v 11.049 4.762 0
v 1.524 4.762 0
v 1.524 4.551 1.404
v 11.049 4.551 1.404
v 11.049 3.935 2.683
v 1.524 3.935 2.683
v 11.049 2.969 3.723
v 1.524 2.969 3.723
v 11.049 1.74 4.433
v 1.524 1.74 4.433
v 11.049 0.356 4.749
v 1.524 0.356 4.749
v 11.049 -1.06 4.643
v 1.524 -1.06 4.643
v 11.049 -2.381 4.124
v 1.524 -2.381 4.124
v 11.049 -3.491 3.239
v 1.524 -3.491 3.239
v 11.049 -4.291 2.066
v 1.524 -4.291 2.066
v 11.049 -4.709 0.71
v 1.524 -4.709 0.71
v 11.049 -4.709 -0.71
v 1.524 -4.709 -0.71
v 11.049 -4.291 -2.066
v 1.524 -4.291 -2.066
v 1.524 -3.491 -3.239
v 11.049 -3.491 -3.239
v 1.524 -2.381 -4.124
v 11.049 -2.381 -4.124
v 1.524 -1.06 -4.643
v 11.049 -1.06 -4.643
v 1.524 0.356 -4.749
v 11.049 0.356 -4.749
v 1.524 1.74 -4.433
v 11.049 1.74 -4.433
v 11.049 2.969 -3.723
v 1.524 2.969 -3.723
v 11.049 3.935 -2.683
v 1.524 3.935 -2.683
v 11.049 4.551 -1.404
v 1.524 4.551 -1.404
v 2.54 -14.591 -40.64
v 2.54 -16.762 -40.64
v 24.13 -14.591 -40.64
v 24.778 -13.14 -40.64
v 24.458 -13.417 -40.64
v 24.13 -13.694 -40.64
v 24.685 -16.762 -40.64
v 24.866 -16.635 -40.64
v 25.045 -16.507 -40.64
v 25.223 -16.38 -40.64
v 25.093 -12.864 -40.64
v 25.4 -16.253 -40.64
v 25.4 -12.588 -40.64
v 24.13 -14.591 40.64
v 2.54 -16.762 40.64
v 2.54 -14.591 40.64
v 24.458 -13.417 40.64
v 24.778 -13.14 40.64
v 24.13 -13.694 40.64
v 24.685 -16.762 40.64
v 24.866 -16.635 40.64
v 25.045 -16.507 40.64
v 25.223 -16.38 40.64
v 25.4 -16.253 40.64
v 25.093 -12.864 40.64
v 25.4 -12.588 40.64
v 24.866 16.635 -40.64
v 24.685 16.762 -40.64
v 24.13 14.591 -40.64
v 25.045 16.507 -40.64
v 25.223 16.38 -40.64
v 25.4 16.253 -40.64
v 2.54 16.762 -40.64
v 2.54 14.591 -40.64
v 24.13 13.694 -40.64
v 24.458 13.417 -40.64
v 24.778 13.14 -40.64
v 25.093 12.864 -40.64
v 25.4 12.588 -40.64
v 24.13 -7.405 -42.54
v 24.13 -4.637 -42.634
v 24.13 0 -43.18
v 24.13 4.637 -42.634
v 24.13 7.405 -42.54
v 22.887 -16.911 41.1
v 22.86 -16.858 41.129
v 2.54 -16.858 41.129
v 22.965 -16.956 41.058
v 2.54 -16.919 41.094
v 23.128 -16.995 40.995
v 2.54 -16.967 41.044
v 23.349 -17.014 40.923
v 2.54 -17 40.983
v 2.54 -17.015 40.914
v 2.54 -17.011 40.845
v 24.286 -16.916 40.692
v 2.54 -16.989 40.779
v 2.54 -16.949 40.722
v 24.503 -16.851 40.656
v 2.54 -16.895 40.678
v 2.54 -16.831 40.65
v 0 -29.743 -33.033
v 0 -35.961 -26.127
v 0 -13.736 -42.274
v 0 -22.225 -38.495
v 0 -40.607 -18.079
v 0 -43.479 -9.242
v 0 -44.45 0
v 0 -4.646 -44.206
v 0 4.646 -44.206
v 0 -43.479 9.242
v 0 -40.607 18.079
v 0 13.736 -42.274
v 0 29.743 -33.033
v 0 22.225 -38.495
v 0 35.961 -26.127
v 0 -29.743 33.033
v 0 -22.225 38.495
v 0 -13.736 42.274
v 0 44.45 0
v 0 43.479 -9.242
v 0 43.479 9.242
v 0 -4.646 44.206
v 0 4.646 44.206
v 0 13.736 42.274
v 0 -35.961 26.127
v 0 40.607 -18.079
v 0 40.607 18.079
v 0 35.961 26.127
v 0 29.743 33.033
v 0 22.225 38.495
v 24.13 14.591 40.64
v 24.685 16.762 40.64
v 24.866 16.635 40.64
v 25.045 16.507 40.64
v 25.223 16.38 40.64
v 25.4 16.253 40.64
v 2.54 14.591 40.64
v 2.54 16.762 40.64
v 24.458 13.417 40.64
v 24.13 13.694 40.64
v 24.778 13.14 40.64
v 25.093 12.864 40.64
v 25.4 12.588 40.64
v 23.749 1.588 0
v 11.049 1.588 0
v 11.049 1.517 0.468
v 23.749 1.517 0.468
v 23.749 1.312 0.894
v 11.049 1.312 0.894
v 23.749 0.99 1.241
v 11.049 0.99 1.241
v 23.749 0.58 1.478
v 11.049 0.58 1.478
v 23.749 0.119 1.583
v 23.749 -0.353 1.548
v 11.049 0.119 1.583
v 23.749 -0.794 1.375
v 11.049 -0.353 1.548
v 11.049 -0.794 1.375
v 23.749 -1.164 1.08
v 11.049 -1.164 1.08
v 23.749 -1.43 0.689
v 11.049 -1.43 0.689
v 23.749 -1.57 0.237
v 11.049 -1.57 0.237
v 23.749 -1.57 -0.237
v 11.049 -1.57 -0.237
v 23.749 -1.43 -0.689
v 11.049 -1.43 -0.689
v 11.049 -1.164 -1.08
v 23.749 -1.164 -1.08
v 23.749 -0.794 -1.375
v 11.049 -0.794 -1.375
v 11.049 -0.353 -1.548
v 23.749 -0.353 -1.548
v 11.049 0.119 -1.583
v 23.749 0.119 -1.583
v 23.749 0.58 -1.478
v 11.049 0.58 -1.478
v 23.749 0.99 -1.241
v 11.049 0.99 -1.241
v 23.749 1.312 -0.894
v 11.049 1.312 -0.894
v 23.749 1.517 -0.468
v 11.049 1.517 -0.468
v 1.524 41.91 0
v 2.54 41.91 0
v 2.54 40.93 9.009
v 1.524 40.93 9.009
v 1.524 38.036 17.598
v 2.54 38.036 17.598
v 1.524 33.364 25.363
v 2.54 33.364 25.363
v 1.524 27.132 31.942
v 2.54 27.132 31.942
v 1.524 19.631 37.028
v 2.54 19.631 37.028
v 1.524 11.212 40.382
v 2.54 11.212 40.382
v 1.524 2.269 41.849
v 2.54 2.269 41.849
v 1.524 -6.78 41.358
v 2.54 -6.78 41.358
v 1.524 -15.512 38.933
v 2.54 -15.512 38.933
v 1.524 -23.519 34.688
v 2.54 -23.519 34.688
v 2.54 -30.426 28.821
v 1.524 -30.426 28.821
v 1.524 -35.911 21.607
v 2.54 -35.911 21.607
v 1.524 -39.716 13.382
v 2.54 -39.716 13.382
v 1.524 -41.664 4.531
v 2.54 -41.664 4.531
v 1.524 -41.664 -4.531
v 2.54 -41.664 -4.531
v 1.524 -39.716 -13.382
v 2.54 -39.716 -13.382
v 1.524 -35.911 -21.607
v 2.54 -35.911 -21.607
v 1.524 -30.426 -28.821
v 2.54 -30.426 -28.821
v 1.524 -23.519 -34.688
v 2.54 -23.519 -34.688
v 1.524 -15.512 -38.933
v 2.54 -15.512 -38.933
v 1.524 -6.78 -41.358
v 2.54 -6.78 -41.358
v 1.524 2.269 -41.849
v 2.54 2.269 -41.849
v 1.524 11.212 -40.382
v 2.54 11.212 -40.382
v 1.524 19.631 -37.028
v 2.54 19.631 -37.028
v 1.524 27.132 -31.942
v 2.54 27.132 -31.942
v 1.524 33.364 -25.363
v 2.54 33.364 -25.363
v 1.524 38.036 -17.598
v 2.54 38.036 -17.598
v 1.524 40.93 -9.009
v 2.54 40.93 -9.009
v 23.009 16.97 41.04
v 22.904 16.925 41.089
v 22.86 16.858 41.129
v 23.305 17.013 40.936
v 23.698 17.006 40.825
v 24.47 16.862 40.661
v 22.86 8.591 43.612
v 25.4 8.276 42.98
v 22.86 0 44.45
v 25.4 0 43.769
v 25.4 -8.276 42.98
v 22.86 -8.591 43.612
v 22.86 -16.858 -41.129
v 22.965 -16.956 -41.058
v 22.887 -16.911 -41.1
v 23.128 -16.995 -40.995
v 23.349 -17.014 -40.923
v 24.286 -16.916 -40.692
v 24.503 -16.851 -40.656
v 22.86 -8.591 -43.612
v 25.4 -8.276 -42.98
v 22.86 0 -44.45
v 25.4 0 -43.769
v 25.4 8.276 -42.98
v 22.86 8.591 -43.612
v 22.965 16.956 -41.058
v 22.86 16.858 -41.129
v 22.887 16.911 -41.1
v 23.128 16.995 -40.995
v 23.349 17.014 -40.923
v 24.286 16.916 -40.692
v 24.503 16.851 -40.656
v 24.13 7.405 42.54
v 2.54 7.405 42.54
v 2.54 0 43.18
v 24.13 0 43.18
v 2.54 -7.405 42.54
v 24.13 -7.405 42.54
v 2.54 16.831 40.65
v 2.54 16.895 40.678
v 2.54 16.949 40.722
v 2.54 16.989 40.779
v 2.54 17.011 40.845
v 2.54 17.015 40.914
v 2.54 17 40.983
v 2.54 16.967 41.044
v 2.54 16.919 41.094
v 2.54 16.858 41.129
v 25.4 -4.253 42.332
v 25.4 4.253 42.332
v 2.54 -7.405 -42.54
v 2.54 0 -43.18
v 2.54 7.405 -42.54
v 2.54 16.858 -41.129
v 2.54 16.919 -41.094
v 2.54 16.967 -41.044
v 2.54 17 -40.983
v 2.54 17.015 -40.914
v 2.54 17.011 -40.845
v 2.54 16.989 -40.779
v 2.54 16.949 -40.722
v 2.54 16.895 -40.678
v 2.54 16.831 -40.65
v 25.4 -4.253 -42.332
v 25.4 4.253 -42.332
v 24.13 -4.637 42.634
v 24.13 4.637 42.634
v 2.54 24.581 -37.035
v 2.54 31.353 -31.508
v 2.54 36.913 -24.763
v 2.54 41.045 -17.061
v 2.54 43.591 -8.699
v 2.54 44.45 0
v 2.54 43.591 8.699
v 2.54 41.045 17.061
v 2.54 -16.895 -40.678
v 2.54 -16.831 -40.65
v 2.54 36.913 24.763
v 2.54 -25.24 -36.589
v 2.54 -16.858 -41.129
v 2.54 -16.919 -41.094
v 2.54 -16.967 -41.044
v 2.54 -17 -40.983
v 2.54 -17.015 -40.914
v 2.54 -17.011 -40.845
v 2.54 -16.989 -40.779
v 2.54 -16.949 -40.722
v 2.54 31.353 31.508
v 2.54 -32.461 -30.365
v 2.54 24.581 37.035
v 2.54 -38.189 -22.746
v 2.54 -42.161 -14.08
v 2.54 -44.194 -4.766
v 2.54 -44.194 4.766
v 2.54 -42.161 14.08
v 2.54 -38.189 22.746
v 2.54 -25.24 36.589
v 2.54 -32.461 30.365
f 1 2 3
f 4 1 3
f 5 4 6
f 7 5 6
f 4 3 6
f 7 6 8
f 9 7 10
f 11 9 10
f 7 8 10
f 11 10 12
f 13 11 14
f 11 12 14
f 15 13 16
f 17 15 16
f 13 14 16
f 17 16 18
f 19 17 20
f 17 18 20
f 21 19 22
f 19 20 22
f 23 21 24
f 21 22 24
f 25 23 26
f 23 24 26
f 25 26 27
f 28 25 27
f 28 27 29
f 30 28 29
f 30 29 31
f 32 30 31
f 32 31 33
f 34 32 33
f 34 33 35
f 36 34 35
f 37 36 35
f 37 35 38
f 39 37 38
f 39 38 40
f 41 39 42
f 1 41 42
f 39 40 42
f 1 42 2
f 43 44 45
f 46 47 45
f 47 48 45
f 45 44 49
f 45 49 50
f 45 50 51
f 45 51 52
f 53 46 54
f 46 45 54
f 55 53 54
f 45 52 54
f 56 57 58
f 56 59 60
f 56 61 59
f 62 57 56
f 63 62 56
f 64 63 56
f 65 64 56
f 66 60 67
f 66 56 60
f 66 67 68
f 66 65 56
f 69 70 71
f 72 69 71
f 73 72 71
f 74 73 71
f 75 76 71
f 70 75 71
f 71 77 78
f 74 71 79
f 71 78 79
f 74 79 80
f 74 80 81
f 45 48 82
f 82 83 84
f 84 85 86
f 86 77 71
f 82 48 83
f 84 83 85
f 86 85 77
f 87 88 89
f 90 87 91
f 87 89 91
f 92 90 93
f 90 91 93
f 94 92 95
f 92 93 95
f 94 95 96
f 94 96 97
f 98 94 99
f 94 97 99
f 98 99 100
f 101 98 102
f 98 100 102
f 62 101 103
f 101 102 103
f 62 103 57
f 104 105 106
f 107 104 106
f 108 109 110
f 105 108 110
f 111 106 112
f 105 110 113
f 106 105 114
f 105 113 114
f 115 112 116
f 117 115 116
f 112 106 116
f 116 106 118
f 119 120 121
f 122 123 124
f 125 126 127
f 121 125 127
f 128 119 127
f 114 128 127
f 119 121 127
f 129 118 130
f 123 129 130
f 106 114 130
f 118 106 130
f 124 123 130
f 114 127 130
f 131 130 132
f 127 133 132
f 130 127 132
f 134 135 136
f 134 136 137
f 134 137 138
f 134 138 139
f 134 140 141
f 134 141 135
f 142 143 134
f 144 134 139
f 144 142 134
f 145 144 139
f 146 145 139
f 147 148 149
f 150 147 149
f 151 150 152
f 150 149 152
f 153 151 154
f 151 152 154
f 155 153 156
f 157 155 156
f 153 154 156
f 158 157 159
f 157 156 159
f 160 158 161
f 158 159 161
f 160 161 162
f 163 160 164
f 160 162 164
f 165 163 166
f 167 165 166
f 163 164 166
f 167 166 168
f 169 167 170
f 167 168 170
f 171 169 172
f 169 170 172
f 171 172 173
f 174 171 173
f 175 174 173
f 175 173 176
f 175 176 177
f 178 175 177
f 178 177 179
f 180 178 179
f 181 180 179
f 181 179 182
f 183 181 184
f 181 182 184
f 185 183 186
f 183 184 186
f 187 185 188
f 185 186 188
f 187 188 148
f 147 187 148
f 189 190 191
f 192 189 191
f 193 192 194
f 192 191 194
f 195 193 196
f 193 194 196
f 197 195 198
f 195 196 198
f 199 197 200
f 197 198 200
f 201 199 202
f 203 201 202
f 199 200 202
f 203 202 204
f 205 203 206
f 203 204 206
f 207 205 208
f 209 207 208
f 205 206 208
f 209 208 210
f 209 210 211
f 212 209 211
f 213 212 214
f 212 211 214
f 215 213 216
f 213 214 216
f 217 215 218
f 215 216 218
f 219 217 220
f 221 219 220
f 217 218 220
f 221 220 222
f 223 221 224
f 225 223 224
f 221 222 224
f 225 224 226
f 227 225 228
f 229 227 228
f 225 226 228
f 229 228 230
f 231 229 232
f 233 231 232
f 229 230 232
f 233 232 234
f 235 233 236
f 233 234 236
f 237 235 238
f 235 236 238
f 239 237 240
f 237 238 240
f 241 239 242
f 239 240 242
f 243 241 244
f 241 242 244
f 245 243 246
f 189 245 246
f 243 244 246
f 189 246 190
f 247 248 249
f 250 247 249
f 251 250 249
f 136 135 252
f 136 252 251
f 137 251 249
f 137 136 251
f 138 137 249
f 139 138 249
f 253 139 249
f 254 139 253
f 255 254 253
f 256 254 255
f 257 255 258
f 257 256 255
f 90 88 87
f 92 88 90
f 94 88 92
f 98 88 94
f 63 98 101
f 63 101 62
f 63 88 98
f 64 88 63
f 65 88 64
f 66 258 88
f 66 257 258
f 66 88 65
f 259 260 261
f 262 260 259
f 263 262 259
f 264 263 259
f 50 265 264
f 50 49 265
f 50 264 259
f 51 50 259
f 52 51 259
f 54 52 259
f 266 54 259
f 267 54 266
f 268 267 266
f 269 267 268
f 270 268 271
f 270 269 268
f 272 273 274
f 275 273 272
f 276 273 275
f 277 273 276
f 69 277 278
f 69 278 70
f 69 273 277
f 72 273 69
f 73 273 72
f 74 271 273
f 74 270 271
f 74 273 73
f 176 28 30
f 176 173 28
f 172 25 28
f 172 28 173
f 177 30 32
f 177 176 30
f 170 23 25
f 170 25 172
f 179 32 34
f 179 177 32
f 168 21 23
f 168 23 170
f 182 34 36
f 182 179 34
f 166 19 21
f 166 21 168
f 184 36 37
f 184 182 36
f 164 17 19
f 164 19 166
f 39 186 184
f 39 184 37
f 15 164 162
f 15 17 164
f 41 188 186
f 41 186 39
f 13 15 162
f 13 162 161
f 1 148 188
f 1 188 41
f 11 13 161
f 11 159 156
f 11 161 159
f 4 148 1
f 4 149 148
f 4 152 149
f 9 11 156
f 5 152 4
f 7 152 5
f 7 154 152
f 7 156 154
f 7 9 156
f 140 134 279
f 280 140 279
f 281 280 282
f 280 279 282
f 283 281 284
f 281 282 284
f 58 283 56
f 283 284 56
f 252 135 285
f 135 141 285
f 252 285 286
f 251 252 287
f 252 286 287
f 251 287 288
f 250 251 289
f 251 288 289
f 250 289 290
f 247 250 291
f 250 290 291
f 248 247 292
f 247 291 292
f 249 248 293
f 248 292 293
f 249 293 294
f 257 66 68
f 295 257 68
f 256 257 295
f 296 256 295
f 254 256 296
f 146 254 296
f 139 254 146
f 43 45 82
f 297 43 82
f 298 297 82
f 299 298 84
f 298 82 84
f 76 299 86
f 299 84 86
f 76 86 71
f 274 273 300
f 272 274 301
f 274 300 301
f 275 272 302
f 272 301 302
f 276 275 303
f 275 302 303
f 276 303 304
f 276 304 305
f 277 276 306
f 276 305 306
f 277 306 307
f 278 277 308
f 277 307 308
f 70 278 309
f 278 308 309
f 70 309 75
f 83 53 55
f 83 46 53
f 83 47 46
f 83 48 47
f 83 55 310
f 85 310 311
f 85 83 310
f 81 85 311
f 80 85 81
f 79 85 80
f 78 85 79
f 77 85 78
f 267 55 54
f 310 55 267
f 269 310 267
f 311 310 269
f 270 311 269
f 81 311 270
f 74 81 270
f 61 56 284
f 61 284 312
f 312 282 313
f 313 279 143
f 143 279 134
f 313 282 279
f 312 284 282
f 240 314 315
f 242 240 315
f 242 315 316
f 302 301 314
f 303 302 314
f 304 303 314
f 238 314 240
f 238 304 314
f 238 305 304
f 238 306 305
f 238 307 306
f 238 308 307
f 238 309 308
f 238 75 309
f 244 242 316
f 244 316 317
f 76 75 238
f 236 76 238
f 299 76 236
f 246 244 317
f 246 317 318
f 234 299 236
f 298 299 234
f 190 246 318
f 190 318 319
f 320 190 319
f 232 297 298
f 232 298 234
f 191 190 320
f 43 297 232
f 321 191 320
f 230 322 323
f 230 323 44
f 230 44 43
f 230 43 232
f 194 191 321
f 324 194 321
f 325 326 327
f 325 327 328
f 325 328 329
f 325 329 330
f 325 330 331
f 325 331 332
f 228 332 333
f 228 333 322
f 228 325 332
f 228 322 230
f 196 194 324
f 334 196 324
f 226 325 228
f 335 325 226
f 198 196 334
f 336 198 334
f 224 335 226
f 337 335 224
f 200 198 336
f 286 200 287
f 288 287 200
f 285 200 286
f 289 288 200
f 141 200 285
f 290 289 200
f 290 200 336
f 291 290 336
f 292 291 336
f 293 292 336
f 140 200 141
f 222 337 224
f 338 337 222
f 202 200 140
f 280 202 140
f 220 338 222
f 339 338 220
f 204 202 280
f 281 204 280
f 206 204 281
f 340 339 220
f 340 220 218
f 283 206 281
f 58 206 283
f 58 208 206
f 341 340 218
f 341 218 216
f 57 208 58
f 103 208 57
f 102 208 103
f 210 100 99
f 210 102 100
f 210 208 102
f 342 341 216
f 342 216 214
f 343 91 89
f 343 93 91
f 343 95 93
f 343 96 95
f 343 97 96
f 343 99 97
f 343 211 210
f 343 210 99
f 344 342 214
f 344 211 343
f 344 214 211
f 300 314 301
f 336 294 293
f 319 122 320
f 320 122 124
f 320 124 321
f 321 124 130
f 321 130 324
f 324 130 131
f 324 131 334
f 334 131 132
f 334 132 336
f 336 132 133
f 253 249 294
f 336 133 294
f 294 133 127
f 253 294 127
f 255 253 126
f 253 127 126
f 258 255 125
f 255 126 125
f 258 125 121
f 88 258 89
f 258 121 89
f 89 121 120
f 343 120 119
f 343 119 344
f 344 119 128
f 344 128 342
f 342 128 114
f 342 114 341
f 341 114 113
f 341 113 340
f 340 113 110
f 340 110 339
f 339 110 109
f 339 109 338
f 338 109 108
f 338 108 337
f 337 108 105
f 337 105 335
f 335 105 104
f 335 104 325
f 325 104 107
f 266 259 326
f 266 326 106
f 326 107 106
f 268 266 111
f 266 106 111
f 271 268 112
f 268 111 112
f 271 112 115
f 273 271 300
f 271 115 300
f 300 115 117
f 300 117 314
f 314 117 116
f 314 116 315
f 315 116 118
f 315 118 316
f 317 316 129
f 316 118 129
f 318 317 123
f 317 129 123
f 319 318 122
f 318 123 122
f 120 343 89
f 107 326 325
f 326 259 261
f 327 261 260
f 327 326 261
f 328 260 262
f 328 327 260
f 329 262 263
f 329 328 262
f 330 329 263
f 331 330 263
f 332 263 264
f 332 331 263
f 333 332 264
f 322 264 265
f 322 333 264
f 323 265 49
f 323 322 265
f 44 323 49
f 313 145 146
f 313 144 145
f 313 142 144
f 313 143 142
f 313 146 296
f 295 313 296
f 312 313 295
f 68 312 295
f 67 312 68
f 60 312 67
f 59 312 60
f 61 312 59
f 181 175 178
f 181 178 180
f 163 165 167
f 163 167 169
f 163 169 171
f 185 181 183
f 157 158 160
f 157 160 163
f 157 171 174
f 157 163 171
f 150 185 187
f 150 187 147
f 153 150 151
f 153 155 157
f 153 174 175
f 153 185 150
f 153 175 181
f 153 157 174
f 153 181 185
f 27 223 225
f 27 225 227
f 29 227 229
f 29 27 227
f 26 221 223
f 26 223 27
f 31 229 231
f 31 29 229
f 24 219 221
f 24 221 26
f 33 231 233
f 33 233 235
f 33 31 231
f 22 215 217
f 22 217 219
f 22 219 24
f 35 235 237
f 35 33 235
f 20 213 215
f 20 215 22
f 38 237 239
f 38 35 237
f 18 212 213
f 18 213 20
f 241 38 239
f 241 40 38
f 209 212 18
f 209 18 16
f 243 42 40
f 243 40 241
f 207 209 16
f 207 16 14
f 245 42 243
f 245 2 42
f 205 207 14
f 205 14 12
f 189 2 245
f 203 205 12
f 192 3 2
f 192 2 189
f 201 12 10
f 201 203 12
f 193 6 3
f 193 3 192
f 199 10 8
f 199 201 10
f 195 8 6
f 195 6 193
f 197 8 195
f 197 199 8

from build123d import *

# Parameters (mm, degrees)
F0_R       = 44.45
F1_DEPTH   = 25.4
F2_R       = 43.18
F3_DEPTH   = 22.86
F4_R       = 44.45
F4_R_2     = 42.545
F5_DEPTH   = 1.27
F6_W       = 25.4
F6_H       = 81.28
F7_DEPTH   = 63.5
F8_SIZE2   = 0.340285
F8_SIZE    = 1.26999
F8_2_SIZE2 = 0.340285
F8_2_SIZE  = 1.26999
F9_SIZE2   = 0.6805909488
F9_SIZE    = 2.54
F10_R      = 0.254
F11_R      = 41.91
F12_DEPTH  = 1.016
F13_R      = 4.7625
F14_DEPTH  = 9.525
F15_R      = 1.5875
F16_DEPTH  = 12.7


# Not quite as in the source:
# - a fillet or chamfer is up to 0.001 mm smaller than in the source, because OpenCascade refuses the exact size


with BuildPart() as f1:
    # F0 (on Right) → F1 (new body)
    with BuildSketch(Plane.YZ):
        Circle(F0_R)
    extrude(amount=F1_DEPTH)

    # F2 (on face) → F3 (cut)
    with BuildSketch(Plane.YZ.offset(25.4)):
        Circle(F2_R)
    extrude(amount=-F3_DEPTH, mode=Mode.SUBTRACT)

    # F4 (on face) → F5 (join)
    with BuildSketch(Plane.YZ.offset(25.4)):
        Circle(F4_R)
        Circle(F4_R_2, mode=Mode.SUBTRACT)
    extrude(amount=-F5_DEPTH)

    # F6 (on Front) → F7 (cut, symmetric)
    with BuildSketch(Plane.XZ):
        with Locations((15.24, 0)):
            Rectangle(F6_W, F6_H)
    extrude(amount=F7_DEPTH, both=True, mode=Mode.SUBTRACT)

    # F8 (size 1.27 and 0.3402954744 in the source; OpenCascade refuses exactly that, so slightly less here)
    f8_edges = [f1.edges().sort_by_distance(p)[0] for p in [
        (24.13, 0, -42.545),
    ]]
    f8_side = f1.faces().sort_by_distance((24.765, 0, -42.545))[0]
    chamfer(f8_edges, length=F8_SIZE, length2=F8_SIZE2, reference=f8_side)

    # F8#2 (size 1.27 and 0.3402954744 in the source; OpenCascade refuses exactly that, so slightly less here)
    f8_2_edges = [f1.edges().sort_by_distance(p)[0] for p in [
        (24.13, 0, 42.545),
    ]]
    f8_2_side = f1.faces().sort_by_distance((24.765, 0, 42.545))[0]
    chamfer(f8_2_edges, length=F8_2_SIZE, length2=F8_2_SIZE2, reference=f8_2_side)

    # F9
    f9_edges = [f1.edges().sort_by_distance(p)[0] for p in [
        (25.4, 0, -44.45),
        (25.4, 0, 44.45),
    ]]
    f9_side = f1.faces().sort_by_distance((1.257363, 37.256816, -24.243188))[0]
    chamfer(f9_edges, length=F9_SIZE, length2=F9_SIZE2, reference=f9_side)

    # F10
    f10_edges = [f1.edges().sort_by_distance(p)[0] for p in [
        (12.7, 18.005358, -40.64),
        (12.7, -18.005358, -40.64),
        (12.7, -18.005358, 40.64),
        (12.7, 18.005358, 40.64),
    ]]
    fillet(f10_edges, radius=F10_R)

    # F11 (on face) → F12 (cut)
    with BuildSketch(Plane.YZ.offset(2.54)):
        Circle(F11_R)
    extrude(amount=-F12_DEPTH, mode=Mode.SUBTRACT)

    # F13 (on face) → F14 (join)
    with BuildSketch(Plane.YZ.offset(1.524)):
        Circle(F13_R)
    extrude(amount=F14_DEPTH)

    # F15 (on face) → F16 (join)
    with BuildSketch(Plane.YZ.offset(11.049)):
        Circle(F15_R)
    extrude(amount=F16_DEPTH)


solid = f1.part
